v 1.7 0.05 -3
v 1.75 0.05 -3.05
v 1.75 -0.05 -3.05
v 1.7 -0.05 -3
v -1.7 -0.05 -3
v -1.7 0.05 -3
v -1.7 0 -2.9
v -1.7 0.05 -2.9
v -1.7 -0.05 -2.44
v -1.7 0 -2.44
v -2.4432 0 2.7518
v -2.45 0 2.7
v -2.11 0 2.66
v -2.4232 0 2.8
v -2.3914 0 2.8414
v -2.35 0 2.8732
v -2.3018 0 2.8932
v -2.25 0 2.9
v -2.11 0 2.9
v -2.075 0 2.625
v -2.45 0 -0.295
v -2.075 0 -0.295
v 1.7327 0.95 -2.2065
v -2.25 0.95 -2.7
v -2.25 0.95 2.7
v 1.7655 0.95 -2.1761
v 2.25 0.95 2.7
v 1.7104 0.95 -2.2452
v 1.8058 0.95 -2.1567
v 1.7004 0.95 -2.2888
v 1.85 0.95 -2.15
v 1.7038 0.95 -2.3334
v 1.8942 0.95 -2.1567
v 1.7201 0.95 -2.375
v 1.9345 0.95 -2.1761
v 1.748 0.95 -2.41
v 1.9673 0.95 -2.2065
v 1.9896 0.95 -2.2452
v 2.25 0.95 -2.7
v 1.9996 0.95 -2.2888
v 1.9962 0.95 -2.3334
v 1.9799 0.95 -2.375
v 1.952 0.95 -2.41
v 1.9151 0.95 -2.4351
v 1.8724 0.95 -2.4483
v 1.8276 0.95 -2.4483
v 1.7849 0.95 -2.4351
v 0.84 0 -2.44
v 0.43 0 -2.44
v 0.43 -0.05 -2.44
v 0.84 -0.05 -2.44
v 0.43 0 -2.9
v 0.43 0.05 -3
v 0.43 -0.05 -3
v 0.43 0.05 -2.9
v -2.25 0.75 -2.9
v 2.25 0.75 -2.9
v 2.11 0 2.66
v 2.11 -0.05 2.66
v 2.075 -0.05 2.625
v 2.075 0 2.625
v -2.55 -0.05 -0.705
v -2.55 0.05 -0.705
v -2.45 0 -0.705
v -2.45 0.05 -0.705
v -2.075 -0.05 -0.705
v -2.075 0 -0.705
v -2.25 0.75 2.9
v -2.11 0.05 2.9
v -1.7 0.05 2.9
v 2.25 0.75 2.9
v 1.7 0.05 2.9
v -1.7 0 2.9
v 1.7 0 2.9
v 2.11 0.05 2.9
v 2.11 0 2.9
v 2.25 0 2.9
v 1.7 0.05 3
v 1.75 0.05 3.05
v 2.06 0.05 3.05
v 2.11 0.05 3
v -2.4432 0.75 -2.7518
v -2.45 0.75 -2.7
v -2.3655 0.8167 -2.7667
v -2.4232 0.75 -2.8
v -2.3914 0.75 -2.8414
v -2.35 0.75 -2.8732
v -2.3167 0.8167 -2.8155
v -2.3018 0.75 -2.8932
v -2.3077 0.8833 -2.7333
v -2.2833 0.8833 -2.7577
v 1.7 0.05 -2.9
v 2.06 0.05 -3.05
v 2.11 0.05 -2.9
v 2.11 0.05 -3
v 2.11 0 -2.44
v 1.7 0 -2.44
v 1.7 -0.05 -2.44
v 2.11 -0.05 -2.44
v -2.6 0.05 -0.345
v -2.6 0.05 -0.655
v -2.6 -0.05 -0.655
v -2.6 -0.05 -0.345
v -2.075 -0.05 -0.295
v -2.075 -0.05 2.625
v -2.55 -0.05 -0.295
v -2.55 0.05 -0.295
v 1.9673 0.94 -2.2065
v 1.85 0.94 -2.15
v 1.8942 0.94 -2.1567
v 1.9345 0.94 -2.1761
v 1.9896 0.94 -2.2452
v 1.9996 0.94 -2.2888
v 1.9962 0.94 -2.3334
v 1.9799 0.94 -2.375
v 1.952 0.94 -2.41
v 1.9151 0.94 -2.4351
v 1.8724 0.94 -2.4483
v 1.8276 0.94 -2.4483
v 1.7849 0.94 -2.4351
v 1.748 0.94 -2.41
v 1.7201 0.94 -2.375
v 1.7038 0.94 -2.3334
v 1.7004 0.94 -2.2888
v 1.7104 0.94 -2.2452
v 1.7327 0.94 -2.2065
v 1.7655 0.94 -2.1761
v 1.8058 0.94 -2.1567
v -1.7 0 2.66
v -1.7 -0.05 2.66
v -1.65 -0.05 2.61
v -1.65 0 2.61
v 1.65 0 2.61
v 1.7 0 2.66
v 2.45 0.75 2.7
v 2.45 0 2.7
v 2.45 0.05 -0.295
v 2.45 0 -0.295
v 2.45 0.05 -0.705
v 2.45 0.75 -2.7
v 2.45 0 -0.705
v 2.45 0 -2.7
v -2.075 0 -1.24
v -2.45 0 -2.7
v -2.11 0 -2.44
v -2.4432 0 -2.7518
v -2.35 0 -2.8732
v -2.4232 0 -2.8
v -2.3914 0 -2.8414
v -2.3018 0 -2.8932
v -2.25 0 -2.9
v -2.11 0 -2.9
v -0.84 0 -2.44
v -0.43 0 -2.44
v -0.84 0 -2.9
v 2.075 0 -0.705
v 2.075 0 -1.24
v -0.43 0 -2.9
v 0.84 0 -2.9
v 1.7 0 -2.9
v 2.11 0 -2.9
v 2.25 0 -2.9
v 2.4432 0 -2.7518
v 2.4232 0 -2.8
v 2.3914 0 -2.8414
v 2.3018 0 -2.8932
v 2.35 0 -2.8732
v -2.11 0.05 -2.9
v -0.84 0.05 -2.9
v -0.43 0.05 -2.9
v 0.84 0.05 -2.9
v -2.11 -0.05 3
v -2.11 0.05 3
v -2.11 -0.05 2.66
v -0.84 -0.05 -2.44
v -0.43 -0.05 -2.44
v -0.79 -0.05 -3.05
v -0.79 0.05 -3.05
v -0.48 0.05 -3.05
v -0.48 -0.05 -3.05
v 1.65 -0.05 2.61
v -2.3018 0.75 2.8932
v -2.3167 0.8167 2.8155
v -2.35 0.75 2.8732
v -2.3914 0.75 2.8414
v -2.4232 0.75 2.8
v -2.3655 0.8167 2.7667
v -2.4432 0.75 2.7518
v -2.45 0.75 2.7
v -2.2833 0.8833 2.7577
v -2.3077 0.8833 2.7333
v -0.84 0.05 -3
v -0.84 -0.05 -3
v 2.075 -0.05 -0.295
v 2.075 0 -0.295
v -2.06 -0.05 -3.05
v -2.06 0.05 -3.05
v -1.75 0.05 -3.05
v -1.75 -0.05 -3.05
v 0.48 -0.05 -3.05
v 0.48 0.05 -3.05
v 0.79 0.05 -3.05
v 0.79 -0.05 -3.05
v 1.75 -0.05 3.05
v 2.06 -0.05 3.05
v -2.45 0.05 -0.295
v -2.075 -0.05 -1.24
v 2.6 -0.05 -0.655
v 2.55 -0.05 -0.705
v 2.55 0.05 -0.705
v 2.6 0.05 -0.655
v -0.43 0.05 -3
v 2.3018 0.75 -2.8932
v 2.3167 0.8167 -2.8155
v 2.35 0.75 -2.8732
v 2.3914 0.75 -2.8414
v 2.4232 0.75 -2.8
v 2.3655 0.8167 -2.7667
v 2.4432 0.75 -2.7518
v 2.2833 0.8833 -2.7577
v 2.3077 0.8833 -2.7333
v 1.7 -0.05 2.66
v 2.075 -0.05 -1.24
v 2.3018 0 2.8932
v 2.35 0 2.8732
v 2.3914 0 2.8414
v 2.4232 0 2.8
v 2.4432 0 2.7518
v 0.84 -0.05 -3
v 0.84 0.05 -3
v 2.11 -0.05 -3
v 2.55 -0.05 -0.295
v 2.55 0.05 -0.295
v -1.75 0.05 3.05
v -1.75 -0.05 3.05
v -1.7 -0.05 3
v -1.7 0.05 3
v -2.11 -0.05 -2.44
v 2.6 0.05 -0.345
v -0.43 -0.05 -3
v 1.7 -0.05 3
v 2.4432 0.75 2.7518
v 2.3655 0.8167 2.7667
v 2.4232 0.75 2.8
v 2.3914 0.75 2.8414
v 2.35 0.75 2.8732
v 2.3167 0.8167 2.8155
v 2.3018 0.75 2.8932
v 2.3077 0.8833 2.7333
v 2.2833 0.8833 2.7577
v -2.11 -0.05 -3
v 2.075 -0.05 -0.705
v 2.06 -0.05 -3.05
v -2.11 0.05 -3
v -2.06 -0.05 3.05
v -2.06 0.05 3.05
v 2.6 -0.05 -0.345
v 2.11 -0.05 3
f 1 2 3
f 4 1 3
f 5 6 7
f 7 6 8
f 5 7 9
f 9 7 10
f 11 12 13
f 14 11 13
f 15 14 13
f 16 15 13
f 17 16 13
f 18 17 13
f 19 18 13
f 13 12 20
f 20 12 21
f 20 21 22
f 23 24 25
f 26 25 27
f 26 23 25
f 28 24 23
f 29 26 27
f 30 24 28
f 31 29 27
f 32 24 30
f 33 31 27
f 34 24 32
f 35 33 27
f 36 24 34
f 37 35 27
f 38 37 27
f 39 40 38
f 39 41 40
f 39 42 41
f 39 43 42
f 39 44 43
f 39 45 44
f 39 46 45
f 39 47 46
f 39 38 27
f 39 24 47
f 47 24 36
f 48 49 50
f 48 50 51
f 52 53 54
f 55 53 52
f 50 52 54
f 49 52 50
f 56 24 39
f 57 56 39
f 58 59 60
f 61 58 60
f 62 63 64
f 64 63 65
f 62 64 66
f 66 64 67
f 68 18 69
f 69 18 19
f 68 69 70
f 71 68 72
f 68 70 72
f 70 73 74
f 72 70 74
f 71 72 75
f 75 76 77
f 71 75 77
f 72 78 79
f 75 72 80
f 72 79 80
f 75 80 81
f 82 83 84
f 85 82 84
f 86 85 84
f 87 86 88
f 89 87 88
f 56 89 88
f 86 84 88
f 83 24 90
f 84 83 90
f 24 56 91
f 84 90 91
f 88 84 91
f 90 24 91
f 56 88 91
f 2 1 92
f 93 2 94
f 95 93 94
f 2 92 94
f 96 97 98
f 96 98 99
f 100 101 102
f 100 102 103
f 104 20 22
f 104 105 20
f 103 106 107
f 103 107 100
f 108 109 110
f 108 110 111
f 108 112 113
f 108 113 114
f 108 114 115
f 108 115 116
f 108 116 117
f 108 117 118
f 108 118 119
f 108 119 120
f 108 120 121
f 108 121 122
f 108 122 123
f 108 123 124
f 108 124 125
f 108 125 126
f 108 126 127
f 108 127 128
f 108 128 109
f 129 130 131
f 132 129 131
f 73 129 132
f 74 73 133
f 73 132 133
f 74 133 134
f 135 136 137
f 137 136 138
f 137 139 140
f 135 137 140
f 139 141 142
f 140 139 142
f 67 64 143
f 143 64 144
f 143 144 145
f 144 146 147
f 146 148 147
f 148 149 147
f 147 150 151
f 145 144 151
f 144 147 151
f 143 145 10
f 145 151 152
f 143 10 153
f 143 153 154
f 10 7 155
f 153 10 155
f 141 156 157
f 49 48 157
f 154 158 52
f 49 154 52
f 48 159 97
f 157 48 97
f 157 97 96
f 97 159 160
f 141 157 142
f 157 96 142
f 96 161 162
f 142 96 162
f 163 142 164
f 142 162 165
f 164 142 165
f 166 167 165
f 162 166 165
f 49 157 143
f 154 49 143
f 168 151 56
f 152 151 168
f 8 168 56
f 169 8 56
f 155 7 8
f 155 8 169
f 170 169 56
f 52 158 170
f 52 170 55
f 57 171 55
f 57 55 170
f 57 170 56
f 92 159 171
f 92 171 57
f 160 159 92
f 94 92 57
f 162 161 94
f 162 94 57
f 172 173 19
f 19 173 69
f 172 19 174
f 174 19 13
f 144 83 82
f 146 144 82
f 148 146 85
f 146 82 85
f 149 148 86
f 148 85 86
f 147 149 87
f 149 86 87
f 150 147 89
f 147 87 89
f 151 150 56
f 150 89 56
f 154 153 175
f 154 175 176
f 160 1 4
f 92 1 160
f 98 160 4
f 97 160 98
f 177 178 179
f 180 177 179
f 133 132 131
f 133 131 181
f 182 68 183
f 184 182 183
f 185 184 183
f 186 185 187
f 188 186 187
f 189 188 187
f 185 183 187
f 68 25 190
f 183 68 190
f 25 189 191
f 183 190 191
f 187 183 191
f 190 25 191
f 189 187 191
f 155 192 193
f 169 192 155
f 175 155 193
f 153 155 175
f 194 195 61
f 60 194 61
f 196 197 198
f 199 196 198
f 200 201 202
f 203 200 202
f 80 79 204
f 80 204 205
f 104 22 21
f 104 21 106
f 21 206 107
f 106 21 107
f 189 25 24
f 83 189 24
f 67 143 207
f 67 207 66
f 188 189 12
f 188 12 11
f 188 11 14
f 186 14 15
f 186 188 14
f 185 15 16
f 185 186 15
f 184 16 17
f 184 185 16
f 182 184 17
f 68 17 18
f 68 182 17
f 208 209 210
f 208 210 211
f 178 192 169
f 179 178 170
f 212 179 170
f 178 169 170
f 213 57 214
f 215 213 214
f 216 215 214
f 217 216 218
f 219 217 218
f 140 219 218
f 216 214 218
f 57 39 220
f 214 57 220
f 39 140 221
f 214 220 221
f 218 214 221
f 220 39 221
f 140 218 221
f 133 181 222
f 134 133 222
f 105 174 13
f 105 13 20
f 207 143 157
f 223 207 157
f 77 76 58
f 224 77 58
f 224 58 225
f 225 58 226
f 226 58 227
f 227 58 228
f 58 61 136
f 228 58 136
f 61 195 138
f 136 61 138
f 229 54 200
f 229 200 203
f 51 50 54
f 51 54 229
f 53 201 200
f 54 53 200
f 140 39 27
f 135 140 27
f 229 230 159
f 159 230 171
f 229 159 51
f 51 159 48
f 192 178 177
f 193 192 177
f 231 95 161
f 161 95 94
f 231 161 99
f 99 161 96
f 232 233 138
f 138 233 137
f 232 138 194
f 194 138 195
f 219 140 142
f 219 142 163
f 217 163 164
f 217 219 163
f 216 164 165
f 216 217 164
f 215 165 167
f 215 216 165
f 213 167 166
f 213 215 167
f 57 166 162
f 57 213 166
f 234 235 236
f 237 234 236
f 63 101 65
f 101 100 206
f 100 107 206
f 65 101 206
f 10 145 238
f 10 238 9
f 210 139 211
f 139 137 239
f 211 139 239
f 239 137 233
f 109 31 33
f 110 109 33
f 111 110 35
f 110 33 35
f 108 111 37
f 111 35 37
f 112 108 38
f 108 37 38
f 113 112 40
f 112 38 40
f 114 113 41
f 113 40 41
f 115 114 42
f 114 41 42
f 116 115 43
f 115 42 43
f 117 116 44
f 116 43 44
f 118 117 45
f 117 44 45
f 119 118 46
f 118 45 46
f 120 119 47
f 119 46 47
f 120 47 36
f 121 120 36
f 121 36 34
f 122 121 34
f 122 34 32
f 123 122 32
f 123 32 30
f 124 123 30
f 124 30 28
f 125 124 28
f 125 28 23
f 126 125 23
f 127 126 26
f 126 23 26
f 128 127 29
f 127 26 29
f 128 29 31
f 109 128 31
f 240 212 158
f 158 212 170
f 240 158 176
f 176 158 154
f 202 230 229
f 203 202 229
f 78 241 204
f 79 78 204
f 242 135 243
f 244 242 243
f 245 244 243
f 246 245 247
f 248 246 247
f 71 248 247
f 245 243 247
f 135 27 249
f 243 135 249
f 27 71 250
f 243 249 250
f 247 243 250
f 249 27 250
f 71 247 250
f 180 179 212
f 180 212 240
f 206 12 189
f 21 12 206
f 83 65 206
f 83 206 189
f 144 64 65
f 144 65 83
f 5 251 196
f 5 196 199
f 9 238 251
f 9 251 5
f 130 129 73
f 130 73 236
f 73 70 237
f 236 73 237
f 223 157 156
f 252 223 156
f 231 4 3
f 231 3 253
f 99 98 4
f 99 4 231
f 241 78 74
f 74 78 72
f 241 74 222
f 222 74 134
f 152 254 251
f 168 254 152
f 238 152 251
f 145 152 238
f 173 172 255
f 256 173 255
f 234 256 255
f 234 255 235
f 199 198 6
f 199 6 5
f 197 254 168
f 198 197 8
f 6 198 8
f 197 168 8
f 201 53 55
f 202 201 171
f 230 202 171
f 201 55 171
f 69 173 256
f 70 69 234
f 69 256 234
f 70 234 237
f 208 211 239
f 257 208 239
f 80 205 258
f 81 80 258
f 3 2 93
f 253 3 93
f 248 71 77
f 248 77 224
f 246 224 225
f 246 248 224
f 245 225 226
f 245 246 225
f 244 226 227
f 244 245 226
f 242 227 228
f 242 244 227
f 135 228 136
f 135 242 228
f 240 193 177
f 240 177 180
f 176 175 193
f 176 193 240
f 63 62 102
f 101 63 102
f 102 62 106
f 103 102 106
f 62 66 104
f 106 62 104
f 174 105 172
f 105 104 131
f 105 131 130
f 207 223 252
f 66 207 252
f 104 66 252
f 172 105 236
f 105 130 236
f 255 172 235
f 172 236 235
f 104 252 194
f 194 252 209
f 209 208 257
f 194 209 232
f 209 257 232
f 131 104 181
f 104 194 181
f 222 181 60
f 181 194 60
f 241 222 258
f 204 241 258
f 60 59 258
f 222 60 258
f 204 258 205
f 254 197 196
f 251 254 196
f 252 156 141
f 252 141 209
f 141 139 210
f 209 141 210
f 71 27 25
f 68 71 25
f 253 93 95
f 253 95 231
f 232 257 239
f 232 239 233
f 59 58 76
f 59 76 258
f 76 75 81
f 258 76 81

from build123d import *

# Parameters (mm, degrees)
SKETCH_1_W           = 4.9
SKETCH_1_H           = 5.8
EXTRUDE_1_DEPTH      = 0.95
FILLET_1_R           = 0.2
CHAMFER_1_SIZE       = 0.2
EXTRUDE_2_DEPTH      = 0.05
EXTRUDE_2_DEPTH_BACK = 0.05
SKETCH_2_W           = 0.41
SKETCH_2_H           = 0.61
CHAMFER_2_SIZE       = 0.05
EXTRUDE_3_DEPTH      = 0.05
EXTRUDE_3_DEPTH_BACK = 0.05
SKETCH_3_W           = 4.15
SKETCH_3_H           = 3.85
SKETCH_3_W_2         = 0.41
SKETCH_3_H_2         = 0.15
SKETCH_3_W_3         = 0.375
SKETCH_3_H_3         = 0.41
SKETCH_3_W_4         = 0.15
CHAMFER_3_SIZE       = 0.05
SKETCH_4_R           = 0.15
CUT_EXTRUDE_1_DEPTH  = 0.01


with BuildPart() as part:
    # Эскиз1 → Бобышка-Вытянуть1 (new body)
    with BuildSketch(Plane(origin=(0, 0, 0), x_dir=(1, 0, 0), z_dir=(0, 1, 0))):
        Rectangle(SKETCH_1_W, SKETCH_1_H)
    extrude(amount=EXTRUDE_1_DEPTH)

    # Скругление1
    fillet_1_edges = [part.edges().sort_by_distance(p)[0] for p in [
        (2.45, 0.475, 2.9),
        (-2.45, 0.475, 2.9),
        (-2.45, 0.475, -2.9),
        (2.45, 0.475, -2.9),
    ]]
    fillet(fillet_1_edges, radius=FILLET_1_R)

    # Фаска1
    chamfer_1_edges = [part.edges().sort_by_distance(p)[0] for p in [
        (-2.45, 0.95, 0),
        (0, 0.95, -2.9),
        (2.45, 0.95, 0),
        (0, 0.95, 2.9),
        (2.391421356, 0.95, 2.841421356),
        (-2.391421356, 0.95, 2.841421356),
        (2.391421356, 0.95, -2.841421356),
        (-2.391421356, 0.95, -2.841421356),
    ]]
    chamfer(chamfer_1_edges, length=CHAMFER_1_SIZE)

    # Эскиз2 → Бобышка-Вытянуть2 (add, two sides: drawn at the far end of the back side and taken through both)
    with BuildSketch(Plane.XZ.offset(-EXTRUDE_2_DEPTH_BACK)):
        with Locations((0.635, -2.745)):
            Rectangle(SKETCH_2_W, SKETCH_2_H)
        with Locations((1.905, -2.745)):
            Rectangle(SKETCH_2_W, SKETCH_2_H)
        with Locations((-0.635, -2.745)):
            Rectangle(SKETCH_2_W, SKETCH_2_H)
        with Locations((-1.905, -2.745)):
            Rectangle(SKETCH_2_W, SKETCH_2_H)
    extrude(amount=EXTRUDE_2_DEPTH + EXTRUDE_2_DEPTH_BACK)

    # Фаска2
    chamfer_2_edges = [part.edges().sort_by_distance(p)[0] for p in [
        (-2.11, 0, -3.05),
        (-1.7, 0, -3.05),
        (1.7, 0, -3.05),
        (2.11, 0, -3.05),
        (0.43, 0, -3.05),
        (0.84, 0, -3.05),
        (-0.84, 0, -3.05),
        (-0.43, 0, -3.05),
    ]]
    chamfer(chamfer_2_edges, length=CHAMFER_2_SIZE)

    # Эскиз3 → Бобышка-Вытянуть3 (add, two sides: drawn at the far end of the back side and taken through both)
    with BuildSketch(Plane.XZ.offset(-EXTRUDE_3_DEPTH_BACK)):
        with Locations((0, 0.685)):
            Rectangle(SKETCH_3_W, SKETCH_3_H)
        with Locations((1.905, 2.975)):
            Rectangle(SKETCH_3_W_2, SKETCH_3_H_2)
        Polygon((1.7, 2.61), (2.075, 2.61), (2.11, 2.61), (2.11, 2.9), (1.7, 2.9), align=None)
        with Locations((-1.905, 2.975)):
            Rectangle(SKETCH_3_W_2, SKETCH_3_H_2)
        Polygon((-2.11, 2.61), (-2.075, 2.61), (-1.7, 2.61), (-1.7, 2.9), (-2.11, 2.9), align=None)
        with Locations((2.2625, -0.5)):
            Rectangle(SKETCH_3_W_3, SKETCH_3_H_3)
        with Locations((2.525, -0.5)):
            Rectangle(SKETCH_3_W_4, SKETCH_3_H_3)
        with Locations((-2.2625, -0.5)):
            Rectangle(SKETCH_3_W_3, SKETCH_3_H_3)
        with Locations((-2.525, -0.5)):
            Rectangle(SKETCH_3_W_4, SKETCH_3_H_3)
    extrude(amount=EXTRUDE_3_DEPTH + EXTRUDE_3_DEPTH_BACK)

    # Фаска3
    # the kernel refuses this chamfer: 0.05 mm, written as the material it adds along each edge
    with BuildSketch(Plane(origin=(-1.7, -0.05, 2.61), x_dir=(-0.02749587661058742, 0, 0.9996219169112966), z_dir=(0, 1, 0)), Plane(origin=(1.7, -0.05, 2.61), x_dir=(-0.9996219169112966, 0, -0.02749587661058718), z_dir=(0, 1, 0))) as chamfer_3_piece_1:
        Polygon((CHAMFER_3_SIZE * 0.999621916911, CHAMFER_3_SIZE * 0.0274958766106), (-CHAMFER_3_SIZE * 0.0274958766106, CHAMFER_3_SIZE * 0.999621916911), (0, 0), align=None)
    extrude(amount=0.178584149)
    # the kernel refuses this chamfer: 0.05 mm, written as the material it takes off along each edge
    with BuildSketch(Plane(origin=(-2.6, -0.178584149, -0.295), x_dir=(0.9996219169112966, 0, 0.02749587661058634), z_dir=(0, 1, 0)), Plane(origin=(2.6, -0.178584149, -0.705), x_dir=(-0.9996219169112965, 0, -0.027495876610591732), z_dir=(0, 1, 0)), Plane(origin=(2.6, -0.178584149, -0.295), x_dir=(0.02749587661058736, 0, -0.9996219169112966), z_dir=(0, 1, 0))) as chamfer_3_2_piece_1:
        Polygon((CHAMFER_3_SIZE * 0.999621916911, CHAMFER_3_SIZE * 0.0274958766106), (-CHAMFER_3_SIZE * 0.0274958766106, CHAMFER_3_SIZE * 0.999621916911), (0, 0), align=None)
    extrude(amount=0.357168299, mode=Mode.SUBTRACT)
    with BuildSketch(Plane(origin=(-2.11, -0.178584149, 2.61), x_dir=(-0.02749587661058742, 0, 0.9996219169112966), z_dir=(0, 1, 0))) as chamfer_3_2_piece_2_section:
        Polygon((CHAMFER_3_SIZE * 0.999621916911, CHAMFER_3_SIZE * 0.0274958766106), (-CHAMFER_3_SIZE * 0.0274958766106, CHAMFER_3_SIZE * 0.999621916911), (0, 0), align=None)
    chamfer_3_2_piece_2 = extrude(amount=0.178584149, mode=Mode.PRIVATE)
    chamfer_3_2_piece_2 = split(chamfer_3_2_piece_2, bisect_by=Plane(origin=(-2.075, -0.025, 2.627820513), z_dir=(-1, 0, 0)), keep=Keep.TOP, mode=Mode.PRIVATE)
    add(chamfer_3_2_piece_2, mode=Mode.SUBTRACT)
    with BuildSketch(Plane(origin=(-1.7, -0.178584149, 3.05), x_dir=(-0.9996219169112966, 0, 0.027495876610587302), z_dir=(0, 1, 0)), Plane(origin=(2.11, -0.178584149, 3.05), x_dir=(-0.9996219169112966, 0, 0.02749587661058742), z_dir=(0, 1, 0)), Plane(origin=(-2.6, -0.178584149, -0.705), x_dir=(0.9996219169112966, 0, -0.02749587661058742), z_dir=(0, 1, 0)), Plane(origin=(-2.11, -0.178584149, 3.05), x_dir=(-0.02749587661058742, 0, -0.9996219169112966), z_dir=(0, 1, 0)), Plane(origin=(1.7, -0.178584149, 3.05), x_dir=(-0.027495876610591732, 0, -0.9996219169112965), z_dir=(0, 1, 0))) as chamfer_3_2_piece_3:
        Polygon((CHAMFER_3_SIZE * 0.999621916911, -CHAMFER_3_SIZE * 0.0274958766106), (-CHAMFER_3_SIZE * 0.0274958766106, -CHAMFER_3_SIZE * 0.999621916911), (0, 0), align=None)
    extrude(amount=0.357168299, mode=Mode.SUBTRACT)
    with BuildSketch(Plane(origin=(2.11, -0.178584149, 2.61), x_dir=(0.02749587661058742, 0, 0.9996219169112966), z_dir=(0, 1, 0))) as chamfer_3_2_piece_4_section:
        Polygon((CHAMFER_3_SIZE * 0.999621916911, -CHAMFER_3_SIZE * 0.0274958766106), (-CHAMFER_3_SIZE * 0.0274958766106, -CHAMFER_3_SIZE * 0.999621916911), (0, 0), align=None)
    chamfer_3_2_piece_4 = extrude(amount=0.178584149, mode=Mode.PRIVATE)
    chamfer_3_2_piece_4 = split(chamfer_3_2_piece_4, bisect_by=Plane(origin=(2.075, -0.025, 2.627820513), z_dir=(1, 0, 0)), keep=Keep.TOP, mode=Mode.PRIVATE)
    add(chamfer_3_2_piece_4, mode=Mode.SUBTRACT)

    # Эскиз4 → Вырез-Вытянуть1 (cut)
    with BuildSketch(Plane(origin=(0, 0.95, 0), x_dir=(1, 0, 0), z_dir=(0, 1, 0))):
        with Locations(Location((1.85, 2.3, 0), (0, 0, 270))):
            Circle(SKETCH_4_R)
    extrude(amount=-CUT_EXTRUDE_1_DEPTH, mode=Mode.SUBTRACT)


solid = part.part
